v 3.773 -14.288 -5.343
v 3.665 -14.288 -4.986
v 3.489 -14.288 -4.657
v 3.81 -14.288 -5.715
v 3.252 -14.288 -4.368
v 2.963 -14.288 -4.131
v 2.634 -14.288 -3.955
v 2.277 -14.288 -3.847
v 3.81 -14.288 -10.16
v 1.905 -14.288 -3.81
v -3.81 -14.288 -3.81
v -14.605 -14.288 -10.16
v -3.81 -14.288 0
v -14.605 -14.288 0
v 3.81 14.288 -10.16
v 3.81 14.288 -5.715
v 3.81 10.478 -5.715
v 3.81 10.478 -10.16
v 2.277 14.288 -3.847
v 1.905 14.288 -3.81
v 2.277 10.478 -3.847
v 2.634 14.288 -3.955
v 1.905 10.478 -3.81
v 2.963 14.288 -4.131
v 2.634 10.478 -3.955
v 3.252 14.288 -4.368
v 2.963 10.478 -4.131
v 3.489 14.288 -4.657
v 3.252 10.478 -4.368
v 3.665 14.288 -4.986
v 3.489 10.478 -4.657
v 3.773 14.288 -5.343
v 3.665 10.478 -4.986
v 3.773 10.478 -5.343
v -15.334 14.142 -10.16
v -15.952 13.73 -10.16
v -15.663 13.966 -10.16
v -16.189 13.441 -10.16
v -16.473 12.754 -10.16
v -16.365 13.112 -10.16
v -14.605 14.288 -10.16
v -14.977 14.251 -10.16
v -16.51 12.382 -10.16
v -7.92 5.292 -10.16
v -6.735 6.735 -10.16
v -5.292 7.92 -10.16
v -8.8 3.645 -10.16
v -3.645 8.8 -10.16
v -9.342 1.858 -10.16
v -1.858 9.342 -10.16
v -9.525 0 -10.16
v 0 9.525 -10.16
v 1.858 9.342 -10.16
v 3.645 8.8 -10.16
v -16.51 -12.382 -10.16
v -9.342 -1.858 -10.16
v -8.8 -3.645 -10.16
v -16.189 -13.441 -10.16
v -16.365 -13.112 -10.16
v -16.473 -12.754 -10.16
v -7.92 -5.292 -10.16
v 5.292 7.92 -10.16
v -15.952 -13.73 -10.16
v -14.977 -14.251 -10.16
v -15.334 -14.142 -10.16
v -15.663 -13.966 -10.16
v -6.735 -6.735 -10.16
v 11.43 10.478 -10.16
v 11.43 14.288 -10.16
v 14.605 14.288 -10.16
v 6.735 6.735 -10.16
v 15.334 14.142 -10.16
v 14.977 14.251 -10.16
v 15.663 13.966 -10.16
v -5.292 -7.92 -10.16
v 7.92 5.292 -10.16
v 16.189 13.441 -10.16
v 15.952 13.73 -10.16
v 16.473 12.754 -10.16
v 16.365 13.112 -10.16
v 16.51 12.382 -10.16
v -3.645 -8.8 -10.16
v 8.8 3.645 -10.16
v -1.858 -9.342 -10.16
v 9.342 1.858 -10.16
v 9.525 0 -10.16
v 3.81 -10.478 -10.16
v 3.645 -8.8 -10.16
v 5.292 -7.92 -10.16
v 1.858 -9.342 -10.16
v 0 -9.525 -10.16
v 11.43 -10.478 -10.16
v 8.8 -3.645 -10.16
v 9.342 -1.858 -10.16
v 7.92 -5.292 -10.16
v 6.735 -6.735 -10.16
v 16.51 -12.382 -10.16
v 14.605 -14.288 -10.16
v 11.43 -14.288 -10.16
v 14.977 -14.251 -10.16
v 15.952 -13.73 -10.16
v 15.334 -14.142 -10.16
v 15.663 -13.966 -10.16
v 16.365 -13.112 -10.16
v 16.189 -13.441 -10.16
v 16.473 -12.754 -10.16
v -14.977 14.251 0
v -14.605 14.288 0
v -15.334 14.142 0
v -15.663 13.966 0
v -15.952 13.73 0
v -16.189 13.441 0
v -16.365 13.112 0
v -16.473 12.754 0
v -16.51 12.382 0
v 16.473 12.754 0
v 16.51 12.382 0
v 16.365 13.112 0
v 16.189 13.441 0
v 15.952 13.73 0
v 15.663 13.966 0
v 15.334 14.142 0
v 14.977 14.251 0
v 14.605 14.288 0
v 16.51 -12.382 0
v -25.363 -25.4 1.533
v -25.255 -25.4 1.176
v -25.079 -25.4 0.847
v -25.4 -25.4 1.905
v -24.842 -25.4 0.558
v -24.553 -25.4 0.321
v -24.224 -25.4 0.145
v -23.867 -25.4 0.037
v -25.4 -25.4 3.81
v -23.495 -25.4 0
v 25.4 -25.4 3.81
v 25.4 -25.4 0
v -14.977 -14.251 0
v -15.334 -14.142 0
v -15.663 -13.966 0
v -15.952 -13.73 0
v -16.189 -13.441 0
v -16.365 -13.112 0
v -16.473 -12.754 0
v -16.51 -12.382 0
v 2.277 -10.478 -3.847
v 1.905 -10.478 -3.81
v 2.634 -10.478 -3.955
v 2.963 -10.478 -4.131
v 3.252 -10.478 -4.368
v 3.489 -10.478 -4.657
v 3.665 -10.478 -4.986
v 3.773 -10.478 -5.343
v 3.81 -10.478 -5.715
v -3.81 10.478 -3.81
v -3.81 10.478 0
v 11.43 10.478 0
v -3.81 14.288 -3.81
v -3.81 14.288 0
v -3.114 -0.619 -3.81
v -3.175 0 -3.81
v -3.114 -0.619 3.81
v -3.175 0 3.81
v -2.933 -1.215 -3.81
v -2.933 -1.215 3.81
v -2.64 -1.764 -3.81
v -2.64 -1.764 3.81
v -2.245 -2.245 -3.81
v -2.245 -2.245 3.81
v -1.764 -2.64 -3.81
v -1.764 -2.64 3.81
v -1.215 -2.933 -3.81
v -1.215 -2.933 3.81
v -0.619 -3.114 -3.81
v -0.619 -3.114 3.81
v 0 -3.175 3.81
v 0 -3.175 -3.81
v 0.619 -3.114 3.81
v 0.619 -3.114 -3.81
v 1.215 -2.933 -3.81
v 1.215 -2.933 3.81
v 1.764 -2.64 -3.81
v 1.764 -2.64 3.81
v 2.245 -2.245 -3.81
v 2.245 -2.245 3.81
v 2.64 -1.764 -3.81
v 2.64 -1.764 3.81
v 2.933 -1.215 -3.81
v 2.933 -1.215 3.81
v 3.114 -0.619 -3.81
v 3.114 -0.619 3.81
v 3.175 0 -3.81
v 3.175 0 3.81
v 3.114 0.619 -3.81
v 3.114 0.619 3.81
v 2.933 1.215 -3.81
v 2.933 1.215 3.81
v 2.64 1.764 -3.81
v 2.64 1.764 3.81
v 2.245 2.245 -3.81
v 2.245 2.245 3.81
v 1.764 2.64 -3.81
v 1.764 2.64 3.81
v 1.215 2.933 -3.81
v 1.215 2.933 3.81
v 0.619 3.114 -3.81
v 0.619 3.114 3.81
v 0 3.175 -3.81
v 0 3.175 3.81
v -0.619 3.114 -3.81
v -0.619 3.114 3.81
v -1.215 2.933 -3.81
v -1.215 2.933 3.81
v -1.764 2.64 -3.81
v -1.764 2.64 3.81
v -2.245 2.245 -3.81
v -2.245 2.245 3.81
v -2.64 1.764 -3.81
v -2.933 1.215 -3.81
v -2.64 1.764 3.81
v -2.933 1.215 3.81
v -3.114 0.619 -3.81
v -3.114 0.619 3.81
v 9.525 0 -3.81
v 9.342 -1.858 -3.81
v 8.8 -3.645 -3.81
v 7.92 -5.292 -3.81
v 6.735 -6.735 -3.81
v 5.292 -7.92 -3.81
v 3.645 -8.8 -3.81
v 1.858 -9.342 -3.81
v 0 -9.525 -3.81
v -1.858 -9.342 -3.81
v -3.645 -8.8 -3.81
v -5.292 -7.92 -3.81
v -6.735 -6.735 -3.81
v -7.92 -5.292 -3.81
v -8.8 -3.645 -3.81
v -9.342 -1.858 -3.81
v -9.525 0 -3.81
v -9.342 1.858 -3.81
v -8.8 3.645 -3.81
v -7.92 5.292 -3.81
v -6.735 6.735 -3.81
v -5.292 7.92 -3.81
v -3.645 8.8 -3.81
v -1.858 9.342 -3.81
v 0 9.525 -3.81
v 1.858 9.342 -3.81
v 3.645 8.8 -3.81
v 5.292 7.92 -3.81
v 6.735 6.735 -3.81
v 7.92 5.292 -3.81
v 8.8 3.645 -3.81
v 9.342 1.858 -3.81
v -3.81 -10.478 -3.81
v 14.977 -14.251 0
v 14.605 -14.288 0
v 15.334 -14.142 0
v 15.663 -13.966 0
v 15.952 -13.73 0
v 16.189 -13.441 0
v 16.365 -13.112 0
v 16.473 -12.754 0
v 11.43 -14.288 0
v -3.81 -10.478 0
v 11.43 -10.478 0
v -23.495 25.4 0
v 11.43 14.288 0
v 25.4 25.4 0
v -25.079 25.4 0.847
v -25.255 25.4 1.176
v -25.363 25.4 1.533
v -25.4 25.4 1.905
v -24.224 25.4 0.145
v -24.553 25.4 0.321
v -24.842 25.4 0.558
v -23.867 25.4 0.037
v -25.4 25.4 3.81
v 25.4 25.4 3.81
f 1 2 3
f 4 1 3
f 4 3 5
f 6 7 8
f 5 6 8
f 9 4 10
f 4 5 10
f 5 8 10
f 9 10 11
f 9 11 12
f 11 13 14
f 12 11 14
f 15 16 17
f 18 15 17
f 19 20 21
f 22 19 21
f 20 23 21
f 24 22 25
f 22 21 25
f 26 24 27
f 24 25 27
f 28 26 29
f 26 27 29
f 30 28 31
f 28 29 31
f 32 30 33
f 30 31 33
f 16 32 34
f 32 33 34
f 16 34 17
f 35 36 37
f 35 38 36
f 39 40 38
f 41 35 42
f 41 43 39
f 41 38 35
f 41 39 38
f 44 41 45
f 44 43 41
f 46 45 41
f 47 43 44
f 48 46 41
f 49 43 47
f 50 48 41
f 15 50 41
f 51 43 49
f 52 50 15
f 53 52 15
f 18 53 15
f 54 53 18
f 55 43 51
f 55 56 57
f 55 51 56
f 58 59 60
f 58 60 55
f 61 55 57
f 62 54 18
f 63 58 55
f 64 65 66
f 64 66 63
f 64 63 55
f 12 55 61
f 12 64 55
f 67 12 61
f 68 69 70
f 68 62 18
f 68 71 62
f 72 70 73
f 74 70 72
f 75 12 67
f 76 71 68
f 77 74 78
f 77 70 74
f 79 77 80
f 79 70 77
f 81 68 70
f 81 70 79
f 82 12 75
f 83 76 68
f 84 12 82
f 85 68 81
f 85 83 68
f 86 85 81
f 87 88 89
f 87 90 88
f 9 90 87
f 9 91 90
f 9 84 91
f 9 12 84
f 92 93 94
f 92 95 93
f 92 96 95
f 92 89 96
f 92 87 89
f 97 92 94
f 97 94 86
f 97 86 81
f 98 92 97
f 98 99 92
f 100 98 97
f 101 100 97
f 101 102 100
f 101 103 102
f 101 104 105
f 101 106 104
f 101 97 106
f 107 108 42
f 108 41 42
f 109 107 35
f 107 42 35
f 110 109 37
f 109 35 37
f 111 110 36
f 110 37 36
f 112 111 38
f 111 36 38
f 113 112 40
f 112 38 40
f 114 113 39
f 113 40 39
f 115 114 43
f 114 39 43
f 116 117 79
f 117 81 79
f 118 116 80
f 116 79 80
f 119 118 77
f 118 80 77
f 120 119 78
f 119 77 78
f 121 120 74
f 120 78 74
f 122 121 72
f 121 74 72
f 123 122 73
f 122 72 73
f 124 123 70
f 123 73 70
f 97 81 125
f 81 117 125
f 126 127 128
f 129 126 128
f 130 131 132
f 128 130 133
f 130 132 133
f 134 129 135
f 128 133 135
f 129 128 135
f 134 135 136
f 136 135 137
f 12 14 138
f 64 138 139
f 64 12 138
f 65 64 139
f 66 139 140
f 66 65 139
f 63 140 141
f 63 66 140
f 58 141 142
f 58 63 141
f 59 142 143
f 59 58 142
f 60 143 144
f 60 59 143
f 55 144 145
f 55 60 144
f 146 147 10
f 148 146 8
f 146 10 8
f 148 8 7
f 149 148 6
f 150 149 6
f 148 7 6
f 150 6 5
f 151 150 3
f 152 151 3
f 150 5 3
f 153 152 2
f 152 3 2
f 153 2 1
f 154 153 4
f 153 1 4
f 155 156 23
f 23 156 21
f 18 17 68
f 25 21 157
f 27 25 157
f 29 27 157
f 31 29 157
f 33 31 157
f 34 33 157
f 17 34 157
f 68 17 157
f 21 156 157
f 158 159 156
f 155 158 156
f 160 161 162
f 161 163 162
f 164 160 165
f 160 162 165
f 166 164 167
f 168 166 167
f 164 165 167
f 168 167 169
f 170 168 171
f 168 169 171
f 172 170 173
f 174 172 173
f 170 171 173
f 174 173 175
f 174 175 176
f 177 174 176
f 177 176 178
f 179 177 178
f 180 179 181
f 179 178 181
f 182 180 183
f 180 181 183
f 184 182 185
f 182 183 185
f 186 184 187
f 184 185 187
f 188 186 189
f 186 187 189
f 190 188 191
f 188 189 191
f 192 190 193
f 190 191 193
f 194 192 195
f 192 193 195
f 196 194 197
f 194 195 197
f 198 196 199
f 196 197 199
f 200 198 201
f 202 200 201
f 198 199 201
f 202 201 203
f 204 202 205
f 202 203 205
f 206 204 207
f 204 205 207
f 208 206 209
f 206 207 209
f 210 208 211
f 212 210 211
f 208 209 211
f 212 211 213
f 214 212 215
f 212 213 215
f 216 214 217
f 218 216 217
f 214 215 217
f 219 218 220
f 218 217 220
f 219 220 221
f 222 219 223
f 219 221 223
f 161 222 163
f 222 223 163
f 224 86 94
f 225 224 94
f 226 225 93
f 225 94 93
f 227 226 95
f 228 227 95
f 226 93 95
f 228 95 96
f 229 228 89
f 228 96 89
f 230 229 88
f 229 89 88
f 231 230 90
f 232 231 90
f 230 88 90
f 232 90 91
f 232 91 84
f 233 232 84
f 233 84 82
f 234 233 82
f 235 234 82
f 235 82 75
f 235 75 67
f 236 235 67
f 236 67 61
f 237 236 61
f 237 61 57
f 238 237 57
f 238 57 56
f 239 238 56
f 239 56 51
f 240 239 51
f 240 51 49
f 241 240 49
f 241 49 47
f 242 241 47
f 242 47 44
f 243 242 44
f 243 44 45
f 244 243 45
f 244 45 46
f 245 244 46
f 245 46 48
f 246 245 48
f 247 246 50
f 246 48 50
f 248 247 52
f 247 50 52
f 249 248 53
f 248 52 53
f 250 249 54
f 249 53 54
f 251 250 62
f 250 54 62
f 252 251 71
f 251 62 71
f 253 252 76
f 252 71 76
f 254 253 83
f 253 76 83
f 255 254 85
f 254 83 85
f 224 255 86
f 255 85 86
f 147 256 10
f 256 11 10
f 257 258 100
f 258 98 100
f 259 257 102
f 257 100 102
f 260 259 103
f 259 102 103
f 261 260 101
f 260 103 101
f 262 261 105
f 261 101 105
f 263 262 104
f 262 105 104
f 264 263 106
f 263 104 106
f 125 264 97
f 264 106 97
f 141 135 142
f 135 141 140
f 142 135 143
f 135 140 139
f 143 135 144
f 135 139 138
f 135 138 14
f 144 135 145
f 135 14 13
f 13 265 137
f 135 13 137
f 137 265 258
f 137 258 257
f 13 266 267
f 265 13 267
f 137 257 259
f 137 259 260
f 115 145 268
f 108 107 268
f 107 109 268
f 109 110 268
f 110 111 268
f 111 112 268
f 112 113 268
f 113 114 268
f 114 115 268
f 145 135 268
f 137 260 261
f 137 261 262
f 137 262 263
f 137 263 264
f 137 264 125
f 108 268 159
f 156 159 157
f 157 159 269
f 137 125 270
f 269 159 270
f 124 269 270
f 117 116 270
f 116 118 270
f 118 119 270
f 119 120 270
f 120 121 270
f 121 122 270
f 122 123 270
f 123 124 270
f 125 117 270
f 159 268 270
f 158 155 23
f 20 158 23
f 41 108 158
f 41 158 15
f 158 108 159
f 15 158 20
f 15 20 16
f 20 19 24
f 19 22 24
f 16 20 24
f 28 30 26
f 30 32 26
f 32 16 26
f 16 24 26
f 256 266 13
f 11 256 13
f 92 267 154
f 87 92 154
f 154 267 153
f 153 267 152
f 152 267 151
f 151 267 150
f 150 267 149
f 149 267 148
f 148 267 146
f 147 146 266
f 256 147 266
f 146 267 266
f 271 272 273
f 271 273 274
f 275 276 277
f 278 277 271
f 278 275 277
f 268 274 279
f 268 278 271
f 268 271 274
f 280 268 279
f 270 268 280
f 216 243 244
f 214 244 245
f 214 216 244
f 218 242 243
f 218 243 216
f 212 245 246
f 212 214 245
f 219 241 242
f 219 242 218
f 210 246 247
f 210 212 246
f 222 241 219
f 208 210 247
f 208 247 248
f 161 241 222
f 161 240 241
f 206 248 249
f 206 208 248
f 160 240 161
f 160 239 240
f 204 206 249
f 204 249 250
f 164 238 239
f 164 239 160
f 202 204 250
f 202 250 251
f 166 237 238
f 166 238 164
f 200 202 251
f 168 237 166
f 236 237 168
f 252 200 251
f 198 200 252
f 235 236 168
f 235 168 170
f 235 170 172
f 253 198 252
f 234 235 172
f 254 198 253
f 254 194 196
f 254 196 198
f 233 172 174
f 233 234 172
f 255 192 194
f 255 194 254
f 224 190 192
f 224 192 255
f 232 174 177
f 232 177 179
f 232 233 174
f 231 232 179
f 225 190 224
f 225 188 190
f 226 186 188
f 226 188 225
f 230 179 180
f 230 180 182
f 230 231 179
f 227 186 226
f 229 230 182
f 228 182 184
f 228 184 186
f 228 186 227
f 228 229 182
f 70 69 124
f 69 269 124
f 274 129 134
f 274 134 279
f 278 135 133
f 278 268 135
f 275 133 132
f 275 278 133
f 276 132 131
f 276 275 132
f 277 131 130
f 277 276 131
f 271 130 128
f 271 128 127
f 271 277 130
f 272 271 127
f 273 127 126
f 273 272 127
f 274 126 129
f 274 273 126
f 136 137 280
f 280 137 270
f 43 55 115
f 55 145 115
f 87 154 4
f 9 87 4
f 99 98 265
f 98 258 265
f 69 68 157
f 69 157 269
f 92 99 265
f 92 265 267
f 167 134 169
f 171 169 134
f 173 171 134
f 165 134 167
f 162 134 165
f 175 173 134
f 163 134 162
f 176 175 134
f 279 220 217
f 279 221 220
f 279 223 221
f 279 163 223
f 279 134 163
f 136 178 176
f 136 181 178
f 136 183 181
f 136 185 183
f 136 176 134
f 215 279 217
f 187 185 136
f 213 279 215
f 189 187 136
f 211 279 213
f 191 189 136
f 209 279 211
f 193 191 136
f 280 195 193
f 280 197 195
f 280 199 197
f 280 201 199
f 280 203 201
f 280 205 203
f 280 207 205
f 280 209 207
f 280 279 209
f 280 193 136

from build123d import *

# Parameters (mm, degrees)
F0_W           = 50.8
F0_H           = 50.8
F1_DEPTH       = 3.81
F3_DEPTH       = 3.81
F5_DEPTH       = 6.35
F6_R           = 1.905
F8_D           = 6.35
F8_CBORE_D     = 19.05
F8_CBORE_DEPTH = 6.35


with BuildPart() as f1:
    # F0 (on Top) → F1 (new body)
    with BuildSketch(Plane.XY):
        Rectangle(F0_W, F0_H)
    extrude(amount=F1_DEPTH)

    # F2 (on face) → F3 (join)
    with BuildSketch(Plane(origin=(0, 0, 0), x_dir=(1, 0, 0), z_dir=(0, 0, -1))):
        Polygon((-3.81, 14.2875), (-16.51, 14.2875), (-16.51, -14.2875), (-3.81, -14.2875), (-3.81, -10.4775), (11.43, -10.4775), (11.43, -14.2875), (16.51, -14.2875), (16.51, 14.2875), (11.43, 14.2875), (11.43, 10.4775), (-3.81, 10.4775), align=None)
    extrude(amount=F3_DEPTH)

    # F4 (on face) → F5 (join)
    with BuildSketch(Plane(origin=(0, 0, -3.81), x_dir=(1, 0, 0), z_dir=(0, 0, -1))):
        Polygon((3.81, 14.2875), (-16.51, 14.2875), (-16.51, -14.2875), (3.81, -14.2875), (3.81, -10.4775), (11.43, -10.4775), (11.43, -14.2875), (16.51, -14.2875), (16.51, 14.2875), (11.43, 14.2875), (11.43, 10.4775), (3.81, 10.4775), align=None)
    extrude(amount=F5_DEPTH)

    # F6
    f6_edges = [f1.edges().sort_by_distance(p)[0] for p in [
        (3.81, -12.3825, -3.81),
        (16.51, -14.2875, -5.08),
        (16.51, 14.2875, -5.08),
        (3.81, 12.3825, -3.81),
        (-16.51, 14.2875, -5.08),
        (-16.51, -14.2875, -5.08),
        (-25.4, 0, 0),
    ]]
    fillet(f6_edges, radius=F6_R)

    # F8 (through all)
    with Locations(Plane(origin=(0, 0, -10.16), x_dir=(1, 0, 0), z_dir=(0, 0, -1))):
        with Locations((0, 0)):
            CounterBoreHole(F8_D / 2, F8_CBORE_D / 2, F8_CBORE_DEPTH)


solid = f1.part
